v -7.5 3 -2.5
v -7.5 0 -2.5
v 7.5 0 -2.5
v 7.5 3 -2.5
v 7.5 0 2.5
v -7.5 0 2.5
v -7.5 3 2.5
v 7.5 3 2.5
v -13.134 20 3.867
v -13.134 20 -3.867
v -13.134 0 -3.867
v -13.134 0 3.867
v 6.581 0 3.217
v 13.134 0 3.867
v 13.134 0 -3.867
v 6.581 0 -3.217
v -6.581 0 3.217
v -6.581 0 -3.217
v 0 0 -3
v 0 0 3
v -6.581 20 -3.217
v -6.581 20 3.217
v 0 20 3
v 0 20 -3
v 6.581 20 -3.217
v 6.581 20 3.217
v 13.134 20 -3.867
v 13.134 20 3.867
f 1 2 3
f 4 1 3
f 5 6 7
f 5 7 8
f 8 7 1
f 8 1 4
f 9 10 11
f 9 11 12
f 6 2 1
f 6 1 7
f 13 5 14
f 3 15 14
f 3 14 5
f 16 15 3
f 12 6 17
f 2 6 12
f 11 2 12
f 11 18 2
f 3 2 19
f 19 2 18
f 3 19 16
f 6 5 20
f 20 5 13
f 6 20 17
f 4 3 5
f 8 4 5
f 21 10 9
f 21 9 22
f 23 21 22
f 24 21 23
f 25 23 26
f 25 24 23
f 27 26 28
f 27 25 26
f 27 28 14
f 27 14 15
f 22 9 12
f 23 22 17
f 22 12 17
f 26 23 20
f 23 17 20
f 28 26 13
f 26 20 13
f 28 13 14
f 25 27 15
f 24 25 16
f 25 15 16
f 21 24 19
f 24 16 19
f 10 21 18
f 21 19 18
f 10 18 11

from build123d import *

# Parameters (mm, degrees)
BOSS_EXTRUDE1_DEPTH = 9
BOSS_EXTRUDE2_DEPTH = 11
SKETCH4_W           = 15
SKETCH4_H           = 5
CUT_EXTRUDE1_DEPTH  = 3


with BuildPart() as part:
    # Sketch2 → Boss-Extrude1 (new body)
    with BuildSketch(Plane(origin=(0, 0, 0), x_dir=(1, 0, 0), z_dir=(0, 1, 0))):
        with BuildLine():
            ThreePointArc((-13.134406493, 3.867125393), (0, 3), (13.134406493, 3.867125393))
            Line((13.134406493, 3.867125393), (13.134406493, -3.867125393))
            ThreePointArc((13.134406493, -3.867125393), (0, -3), (-13.134406493, -3.867125393))
            Line((-13.134406493, -3.867125393), (-13.134406493, 3.867125393))
        make_face()
    extrude(amount=BOSS_EXTRUDE1_DEPTH)

    # Sketch3 → Boss-Extrude2 (add)
    with BuildSketch(Plane(origin=(0, 9, 0), x_dir=(1, 0, 0), z_dir=(0, 1, 0))):
        with BuildLine():
            Line((13.134406493, -3.867125393), (13.134406493, 3.867125393))
            ThreePointArc((13.134406493, 3.867125393), (0, 3), (-13.134406493, 3.867125393))
            Line((-13.134406493, 3.867125393), (-13.134406493, -3.867125393))
            ThreePointArc((-13.134406493, -3.867125393), (0, -3), (13.134406493, -3.867125393))
        make_face()
    extrude(amount=BOSS_EXTRUDE2_DEPTH)

    # Sketch4 → Cut-Extrude1 (cut)
    with BuildSketch(Plane.XZ):
        Rectangle(SKETCH4_W, SKETCH4_H)
    extrude(amount=-CUT_EXTRUDE1_DEPTH, mode=Mode.SUBTRACT)


solid = part.part
